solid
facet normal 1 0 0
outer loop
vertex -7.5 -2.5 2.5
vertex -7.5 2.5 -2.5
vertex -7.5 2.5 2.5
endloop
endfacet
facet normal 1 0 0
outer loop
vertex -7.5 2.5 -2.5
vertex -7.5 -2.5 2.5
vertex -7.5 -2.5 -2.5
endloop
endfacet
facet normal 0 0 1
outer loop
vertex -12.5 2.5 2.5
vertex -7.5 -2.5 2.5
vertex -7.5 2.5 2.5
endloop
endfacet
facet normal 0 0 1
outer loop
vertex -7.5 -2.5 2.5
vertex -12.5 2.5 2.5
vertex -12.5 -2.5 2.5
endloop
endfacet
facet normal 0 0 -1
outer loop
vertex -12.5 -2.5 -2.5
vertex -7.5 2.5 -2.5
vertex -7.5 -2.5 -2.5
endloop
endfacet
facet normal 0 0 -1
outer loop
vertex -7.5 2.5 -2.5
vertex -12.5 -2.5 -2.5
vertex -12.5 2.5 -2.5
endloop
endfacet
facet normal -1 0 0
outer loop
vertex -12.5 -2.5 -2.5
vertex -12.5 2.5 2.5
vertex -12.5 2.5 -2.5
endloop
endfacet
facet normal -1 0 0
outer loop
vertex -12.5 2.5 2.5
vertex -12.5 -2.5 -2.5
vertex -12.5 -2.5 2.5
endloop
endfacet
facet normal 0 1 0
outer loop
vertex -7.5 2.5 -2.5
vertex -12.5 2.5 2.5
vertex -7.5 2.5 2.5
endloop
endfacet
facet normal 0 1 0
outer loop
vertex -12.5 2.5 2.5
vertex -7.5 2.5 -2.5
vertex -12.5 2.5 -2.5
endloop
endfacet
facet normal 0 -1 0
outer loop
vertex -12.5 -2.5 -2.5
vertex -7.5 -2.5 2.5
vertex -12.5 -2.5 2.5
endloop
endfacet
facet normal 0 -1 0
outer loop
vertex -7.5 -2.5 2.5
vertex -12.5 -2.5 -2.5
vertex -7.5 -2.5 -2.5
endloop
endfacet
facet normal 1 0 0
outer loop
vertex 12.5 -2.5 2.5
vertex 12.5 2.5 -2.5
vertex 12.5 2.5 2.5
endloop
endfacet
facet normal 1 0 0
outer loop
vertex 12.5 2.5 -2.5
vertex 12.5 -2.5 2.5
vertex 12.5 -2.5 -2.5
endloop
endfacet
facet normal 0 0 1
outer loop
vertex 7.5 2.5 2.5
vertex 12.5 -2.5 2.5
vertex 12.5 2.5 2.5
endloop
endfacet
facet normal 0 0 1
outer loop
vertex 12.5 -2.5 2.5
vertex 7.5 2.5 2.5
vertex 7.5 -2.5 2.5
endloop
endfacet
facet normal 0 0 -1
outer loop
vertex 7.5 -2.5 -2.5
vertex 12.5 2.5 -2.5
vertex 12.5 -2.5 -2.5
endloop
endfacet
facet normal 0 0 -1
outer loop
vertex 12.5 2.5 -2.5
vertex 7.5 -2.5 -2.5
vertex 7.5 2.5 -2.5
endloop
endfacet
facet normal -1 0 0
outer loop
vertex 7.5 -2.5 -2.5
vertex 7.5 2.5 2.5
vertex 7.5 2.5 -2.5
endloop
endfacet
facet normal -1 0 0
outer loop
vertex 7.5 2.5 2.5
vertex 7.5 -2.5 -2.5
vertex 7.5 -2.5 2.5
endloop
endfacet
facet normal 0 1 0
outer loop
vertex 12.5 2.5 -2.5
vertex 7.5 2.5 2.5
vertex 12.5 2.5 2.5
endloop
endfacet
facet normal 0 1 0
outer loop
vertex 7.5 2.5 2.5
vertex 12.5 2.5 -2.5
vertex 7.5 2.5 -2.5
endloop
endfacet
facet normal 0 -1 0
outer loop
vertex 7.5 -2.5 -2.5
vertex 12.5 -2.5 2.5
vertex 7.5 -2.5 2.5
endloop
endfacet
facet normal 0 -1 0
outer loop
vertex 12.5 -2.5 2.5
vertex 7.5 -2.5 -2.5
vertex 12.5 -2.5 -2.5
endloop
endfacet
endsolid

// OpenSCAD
// Two disjoint cubes. Exercises solid_count, and the refusal of genus on a
// multi-body part.
size = 5;
gap = 20;

translate([-gap / 2, 0, 0]) cube(size, center = true);
translate([ gap / 2, 0, 0]) cube(size, center = true);
